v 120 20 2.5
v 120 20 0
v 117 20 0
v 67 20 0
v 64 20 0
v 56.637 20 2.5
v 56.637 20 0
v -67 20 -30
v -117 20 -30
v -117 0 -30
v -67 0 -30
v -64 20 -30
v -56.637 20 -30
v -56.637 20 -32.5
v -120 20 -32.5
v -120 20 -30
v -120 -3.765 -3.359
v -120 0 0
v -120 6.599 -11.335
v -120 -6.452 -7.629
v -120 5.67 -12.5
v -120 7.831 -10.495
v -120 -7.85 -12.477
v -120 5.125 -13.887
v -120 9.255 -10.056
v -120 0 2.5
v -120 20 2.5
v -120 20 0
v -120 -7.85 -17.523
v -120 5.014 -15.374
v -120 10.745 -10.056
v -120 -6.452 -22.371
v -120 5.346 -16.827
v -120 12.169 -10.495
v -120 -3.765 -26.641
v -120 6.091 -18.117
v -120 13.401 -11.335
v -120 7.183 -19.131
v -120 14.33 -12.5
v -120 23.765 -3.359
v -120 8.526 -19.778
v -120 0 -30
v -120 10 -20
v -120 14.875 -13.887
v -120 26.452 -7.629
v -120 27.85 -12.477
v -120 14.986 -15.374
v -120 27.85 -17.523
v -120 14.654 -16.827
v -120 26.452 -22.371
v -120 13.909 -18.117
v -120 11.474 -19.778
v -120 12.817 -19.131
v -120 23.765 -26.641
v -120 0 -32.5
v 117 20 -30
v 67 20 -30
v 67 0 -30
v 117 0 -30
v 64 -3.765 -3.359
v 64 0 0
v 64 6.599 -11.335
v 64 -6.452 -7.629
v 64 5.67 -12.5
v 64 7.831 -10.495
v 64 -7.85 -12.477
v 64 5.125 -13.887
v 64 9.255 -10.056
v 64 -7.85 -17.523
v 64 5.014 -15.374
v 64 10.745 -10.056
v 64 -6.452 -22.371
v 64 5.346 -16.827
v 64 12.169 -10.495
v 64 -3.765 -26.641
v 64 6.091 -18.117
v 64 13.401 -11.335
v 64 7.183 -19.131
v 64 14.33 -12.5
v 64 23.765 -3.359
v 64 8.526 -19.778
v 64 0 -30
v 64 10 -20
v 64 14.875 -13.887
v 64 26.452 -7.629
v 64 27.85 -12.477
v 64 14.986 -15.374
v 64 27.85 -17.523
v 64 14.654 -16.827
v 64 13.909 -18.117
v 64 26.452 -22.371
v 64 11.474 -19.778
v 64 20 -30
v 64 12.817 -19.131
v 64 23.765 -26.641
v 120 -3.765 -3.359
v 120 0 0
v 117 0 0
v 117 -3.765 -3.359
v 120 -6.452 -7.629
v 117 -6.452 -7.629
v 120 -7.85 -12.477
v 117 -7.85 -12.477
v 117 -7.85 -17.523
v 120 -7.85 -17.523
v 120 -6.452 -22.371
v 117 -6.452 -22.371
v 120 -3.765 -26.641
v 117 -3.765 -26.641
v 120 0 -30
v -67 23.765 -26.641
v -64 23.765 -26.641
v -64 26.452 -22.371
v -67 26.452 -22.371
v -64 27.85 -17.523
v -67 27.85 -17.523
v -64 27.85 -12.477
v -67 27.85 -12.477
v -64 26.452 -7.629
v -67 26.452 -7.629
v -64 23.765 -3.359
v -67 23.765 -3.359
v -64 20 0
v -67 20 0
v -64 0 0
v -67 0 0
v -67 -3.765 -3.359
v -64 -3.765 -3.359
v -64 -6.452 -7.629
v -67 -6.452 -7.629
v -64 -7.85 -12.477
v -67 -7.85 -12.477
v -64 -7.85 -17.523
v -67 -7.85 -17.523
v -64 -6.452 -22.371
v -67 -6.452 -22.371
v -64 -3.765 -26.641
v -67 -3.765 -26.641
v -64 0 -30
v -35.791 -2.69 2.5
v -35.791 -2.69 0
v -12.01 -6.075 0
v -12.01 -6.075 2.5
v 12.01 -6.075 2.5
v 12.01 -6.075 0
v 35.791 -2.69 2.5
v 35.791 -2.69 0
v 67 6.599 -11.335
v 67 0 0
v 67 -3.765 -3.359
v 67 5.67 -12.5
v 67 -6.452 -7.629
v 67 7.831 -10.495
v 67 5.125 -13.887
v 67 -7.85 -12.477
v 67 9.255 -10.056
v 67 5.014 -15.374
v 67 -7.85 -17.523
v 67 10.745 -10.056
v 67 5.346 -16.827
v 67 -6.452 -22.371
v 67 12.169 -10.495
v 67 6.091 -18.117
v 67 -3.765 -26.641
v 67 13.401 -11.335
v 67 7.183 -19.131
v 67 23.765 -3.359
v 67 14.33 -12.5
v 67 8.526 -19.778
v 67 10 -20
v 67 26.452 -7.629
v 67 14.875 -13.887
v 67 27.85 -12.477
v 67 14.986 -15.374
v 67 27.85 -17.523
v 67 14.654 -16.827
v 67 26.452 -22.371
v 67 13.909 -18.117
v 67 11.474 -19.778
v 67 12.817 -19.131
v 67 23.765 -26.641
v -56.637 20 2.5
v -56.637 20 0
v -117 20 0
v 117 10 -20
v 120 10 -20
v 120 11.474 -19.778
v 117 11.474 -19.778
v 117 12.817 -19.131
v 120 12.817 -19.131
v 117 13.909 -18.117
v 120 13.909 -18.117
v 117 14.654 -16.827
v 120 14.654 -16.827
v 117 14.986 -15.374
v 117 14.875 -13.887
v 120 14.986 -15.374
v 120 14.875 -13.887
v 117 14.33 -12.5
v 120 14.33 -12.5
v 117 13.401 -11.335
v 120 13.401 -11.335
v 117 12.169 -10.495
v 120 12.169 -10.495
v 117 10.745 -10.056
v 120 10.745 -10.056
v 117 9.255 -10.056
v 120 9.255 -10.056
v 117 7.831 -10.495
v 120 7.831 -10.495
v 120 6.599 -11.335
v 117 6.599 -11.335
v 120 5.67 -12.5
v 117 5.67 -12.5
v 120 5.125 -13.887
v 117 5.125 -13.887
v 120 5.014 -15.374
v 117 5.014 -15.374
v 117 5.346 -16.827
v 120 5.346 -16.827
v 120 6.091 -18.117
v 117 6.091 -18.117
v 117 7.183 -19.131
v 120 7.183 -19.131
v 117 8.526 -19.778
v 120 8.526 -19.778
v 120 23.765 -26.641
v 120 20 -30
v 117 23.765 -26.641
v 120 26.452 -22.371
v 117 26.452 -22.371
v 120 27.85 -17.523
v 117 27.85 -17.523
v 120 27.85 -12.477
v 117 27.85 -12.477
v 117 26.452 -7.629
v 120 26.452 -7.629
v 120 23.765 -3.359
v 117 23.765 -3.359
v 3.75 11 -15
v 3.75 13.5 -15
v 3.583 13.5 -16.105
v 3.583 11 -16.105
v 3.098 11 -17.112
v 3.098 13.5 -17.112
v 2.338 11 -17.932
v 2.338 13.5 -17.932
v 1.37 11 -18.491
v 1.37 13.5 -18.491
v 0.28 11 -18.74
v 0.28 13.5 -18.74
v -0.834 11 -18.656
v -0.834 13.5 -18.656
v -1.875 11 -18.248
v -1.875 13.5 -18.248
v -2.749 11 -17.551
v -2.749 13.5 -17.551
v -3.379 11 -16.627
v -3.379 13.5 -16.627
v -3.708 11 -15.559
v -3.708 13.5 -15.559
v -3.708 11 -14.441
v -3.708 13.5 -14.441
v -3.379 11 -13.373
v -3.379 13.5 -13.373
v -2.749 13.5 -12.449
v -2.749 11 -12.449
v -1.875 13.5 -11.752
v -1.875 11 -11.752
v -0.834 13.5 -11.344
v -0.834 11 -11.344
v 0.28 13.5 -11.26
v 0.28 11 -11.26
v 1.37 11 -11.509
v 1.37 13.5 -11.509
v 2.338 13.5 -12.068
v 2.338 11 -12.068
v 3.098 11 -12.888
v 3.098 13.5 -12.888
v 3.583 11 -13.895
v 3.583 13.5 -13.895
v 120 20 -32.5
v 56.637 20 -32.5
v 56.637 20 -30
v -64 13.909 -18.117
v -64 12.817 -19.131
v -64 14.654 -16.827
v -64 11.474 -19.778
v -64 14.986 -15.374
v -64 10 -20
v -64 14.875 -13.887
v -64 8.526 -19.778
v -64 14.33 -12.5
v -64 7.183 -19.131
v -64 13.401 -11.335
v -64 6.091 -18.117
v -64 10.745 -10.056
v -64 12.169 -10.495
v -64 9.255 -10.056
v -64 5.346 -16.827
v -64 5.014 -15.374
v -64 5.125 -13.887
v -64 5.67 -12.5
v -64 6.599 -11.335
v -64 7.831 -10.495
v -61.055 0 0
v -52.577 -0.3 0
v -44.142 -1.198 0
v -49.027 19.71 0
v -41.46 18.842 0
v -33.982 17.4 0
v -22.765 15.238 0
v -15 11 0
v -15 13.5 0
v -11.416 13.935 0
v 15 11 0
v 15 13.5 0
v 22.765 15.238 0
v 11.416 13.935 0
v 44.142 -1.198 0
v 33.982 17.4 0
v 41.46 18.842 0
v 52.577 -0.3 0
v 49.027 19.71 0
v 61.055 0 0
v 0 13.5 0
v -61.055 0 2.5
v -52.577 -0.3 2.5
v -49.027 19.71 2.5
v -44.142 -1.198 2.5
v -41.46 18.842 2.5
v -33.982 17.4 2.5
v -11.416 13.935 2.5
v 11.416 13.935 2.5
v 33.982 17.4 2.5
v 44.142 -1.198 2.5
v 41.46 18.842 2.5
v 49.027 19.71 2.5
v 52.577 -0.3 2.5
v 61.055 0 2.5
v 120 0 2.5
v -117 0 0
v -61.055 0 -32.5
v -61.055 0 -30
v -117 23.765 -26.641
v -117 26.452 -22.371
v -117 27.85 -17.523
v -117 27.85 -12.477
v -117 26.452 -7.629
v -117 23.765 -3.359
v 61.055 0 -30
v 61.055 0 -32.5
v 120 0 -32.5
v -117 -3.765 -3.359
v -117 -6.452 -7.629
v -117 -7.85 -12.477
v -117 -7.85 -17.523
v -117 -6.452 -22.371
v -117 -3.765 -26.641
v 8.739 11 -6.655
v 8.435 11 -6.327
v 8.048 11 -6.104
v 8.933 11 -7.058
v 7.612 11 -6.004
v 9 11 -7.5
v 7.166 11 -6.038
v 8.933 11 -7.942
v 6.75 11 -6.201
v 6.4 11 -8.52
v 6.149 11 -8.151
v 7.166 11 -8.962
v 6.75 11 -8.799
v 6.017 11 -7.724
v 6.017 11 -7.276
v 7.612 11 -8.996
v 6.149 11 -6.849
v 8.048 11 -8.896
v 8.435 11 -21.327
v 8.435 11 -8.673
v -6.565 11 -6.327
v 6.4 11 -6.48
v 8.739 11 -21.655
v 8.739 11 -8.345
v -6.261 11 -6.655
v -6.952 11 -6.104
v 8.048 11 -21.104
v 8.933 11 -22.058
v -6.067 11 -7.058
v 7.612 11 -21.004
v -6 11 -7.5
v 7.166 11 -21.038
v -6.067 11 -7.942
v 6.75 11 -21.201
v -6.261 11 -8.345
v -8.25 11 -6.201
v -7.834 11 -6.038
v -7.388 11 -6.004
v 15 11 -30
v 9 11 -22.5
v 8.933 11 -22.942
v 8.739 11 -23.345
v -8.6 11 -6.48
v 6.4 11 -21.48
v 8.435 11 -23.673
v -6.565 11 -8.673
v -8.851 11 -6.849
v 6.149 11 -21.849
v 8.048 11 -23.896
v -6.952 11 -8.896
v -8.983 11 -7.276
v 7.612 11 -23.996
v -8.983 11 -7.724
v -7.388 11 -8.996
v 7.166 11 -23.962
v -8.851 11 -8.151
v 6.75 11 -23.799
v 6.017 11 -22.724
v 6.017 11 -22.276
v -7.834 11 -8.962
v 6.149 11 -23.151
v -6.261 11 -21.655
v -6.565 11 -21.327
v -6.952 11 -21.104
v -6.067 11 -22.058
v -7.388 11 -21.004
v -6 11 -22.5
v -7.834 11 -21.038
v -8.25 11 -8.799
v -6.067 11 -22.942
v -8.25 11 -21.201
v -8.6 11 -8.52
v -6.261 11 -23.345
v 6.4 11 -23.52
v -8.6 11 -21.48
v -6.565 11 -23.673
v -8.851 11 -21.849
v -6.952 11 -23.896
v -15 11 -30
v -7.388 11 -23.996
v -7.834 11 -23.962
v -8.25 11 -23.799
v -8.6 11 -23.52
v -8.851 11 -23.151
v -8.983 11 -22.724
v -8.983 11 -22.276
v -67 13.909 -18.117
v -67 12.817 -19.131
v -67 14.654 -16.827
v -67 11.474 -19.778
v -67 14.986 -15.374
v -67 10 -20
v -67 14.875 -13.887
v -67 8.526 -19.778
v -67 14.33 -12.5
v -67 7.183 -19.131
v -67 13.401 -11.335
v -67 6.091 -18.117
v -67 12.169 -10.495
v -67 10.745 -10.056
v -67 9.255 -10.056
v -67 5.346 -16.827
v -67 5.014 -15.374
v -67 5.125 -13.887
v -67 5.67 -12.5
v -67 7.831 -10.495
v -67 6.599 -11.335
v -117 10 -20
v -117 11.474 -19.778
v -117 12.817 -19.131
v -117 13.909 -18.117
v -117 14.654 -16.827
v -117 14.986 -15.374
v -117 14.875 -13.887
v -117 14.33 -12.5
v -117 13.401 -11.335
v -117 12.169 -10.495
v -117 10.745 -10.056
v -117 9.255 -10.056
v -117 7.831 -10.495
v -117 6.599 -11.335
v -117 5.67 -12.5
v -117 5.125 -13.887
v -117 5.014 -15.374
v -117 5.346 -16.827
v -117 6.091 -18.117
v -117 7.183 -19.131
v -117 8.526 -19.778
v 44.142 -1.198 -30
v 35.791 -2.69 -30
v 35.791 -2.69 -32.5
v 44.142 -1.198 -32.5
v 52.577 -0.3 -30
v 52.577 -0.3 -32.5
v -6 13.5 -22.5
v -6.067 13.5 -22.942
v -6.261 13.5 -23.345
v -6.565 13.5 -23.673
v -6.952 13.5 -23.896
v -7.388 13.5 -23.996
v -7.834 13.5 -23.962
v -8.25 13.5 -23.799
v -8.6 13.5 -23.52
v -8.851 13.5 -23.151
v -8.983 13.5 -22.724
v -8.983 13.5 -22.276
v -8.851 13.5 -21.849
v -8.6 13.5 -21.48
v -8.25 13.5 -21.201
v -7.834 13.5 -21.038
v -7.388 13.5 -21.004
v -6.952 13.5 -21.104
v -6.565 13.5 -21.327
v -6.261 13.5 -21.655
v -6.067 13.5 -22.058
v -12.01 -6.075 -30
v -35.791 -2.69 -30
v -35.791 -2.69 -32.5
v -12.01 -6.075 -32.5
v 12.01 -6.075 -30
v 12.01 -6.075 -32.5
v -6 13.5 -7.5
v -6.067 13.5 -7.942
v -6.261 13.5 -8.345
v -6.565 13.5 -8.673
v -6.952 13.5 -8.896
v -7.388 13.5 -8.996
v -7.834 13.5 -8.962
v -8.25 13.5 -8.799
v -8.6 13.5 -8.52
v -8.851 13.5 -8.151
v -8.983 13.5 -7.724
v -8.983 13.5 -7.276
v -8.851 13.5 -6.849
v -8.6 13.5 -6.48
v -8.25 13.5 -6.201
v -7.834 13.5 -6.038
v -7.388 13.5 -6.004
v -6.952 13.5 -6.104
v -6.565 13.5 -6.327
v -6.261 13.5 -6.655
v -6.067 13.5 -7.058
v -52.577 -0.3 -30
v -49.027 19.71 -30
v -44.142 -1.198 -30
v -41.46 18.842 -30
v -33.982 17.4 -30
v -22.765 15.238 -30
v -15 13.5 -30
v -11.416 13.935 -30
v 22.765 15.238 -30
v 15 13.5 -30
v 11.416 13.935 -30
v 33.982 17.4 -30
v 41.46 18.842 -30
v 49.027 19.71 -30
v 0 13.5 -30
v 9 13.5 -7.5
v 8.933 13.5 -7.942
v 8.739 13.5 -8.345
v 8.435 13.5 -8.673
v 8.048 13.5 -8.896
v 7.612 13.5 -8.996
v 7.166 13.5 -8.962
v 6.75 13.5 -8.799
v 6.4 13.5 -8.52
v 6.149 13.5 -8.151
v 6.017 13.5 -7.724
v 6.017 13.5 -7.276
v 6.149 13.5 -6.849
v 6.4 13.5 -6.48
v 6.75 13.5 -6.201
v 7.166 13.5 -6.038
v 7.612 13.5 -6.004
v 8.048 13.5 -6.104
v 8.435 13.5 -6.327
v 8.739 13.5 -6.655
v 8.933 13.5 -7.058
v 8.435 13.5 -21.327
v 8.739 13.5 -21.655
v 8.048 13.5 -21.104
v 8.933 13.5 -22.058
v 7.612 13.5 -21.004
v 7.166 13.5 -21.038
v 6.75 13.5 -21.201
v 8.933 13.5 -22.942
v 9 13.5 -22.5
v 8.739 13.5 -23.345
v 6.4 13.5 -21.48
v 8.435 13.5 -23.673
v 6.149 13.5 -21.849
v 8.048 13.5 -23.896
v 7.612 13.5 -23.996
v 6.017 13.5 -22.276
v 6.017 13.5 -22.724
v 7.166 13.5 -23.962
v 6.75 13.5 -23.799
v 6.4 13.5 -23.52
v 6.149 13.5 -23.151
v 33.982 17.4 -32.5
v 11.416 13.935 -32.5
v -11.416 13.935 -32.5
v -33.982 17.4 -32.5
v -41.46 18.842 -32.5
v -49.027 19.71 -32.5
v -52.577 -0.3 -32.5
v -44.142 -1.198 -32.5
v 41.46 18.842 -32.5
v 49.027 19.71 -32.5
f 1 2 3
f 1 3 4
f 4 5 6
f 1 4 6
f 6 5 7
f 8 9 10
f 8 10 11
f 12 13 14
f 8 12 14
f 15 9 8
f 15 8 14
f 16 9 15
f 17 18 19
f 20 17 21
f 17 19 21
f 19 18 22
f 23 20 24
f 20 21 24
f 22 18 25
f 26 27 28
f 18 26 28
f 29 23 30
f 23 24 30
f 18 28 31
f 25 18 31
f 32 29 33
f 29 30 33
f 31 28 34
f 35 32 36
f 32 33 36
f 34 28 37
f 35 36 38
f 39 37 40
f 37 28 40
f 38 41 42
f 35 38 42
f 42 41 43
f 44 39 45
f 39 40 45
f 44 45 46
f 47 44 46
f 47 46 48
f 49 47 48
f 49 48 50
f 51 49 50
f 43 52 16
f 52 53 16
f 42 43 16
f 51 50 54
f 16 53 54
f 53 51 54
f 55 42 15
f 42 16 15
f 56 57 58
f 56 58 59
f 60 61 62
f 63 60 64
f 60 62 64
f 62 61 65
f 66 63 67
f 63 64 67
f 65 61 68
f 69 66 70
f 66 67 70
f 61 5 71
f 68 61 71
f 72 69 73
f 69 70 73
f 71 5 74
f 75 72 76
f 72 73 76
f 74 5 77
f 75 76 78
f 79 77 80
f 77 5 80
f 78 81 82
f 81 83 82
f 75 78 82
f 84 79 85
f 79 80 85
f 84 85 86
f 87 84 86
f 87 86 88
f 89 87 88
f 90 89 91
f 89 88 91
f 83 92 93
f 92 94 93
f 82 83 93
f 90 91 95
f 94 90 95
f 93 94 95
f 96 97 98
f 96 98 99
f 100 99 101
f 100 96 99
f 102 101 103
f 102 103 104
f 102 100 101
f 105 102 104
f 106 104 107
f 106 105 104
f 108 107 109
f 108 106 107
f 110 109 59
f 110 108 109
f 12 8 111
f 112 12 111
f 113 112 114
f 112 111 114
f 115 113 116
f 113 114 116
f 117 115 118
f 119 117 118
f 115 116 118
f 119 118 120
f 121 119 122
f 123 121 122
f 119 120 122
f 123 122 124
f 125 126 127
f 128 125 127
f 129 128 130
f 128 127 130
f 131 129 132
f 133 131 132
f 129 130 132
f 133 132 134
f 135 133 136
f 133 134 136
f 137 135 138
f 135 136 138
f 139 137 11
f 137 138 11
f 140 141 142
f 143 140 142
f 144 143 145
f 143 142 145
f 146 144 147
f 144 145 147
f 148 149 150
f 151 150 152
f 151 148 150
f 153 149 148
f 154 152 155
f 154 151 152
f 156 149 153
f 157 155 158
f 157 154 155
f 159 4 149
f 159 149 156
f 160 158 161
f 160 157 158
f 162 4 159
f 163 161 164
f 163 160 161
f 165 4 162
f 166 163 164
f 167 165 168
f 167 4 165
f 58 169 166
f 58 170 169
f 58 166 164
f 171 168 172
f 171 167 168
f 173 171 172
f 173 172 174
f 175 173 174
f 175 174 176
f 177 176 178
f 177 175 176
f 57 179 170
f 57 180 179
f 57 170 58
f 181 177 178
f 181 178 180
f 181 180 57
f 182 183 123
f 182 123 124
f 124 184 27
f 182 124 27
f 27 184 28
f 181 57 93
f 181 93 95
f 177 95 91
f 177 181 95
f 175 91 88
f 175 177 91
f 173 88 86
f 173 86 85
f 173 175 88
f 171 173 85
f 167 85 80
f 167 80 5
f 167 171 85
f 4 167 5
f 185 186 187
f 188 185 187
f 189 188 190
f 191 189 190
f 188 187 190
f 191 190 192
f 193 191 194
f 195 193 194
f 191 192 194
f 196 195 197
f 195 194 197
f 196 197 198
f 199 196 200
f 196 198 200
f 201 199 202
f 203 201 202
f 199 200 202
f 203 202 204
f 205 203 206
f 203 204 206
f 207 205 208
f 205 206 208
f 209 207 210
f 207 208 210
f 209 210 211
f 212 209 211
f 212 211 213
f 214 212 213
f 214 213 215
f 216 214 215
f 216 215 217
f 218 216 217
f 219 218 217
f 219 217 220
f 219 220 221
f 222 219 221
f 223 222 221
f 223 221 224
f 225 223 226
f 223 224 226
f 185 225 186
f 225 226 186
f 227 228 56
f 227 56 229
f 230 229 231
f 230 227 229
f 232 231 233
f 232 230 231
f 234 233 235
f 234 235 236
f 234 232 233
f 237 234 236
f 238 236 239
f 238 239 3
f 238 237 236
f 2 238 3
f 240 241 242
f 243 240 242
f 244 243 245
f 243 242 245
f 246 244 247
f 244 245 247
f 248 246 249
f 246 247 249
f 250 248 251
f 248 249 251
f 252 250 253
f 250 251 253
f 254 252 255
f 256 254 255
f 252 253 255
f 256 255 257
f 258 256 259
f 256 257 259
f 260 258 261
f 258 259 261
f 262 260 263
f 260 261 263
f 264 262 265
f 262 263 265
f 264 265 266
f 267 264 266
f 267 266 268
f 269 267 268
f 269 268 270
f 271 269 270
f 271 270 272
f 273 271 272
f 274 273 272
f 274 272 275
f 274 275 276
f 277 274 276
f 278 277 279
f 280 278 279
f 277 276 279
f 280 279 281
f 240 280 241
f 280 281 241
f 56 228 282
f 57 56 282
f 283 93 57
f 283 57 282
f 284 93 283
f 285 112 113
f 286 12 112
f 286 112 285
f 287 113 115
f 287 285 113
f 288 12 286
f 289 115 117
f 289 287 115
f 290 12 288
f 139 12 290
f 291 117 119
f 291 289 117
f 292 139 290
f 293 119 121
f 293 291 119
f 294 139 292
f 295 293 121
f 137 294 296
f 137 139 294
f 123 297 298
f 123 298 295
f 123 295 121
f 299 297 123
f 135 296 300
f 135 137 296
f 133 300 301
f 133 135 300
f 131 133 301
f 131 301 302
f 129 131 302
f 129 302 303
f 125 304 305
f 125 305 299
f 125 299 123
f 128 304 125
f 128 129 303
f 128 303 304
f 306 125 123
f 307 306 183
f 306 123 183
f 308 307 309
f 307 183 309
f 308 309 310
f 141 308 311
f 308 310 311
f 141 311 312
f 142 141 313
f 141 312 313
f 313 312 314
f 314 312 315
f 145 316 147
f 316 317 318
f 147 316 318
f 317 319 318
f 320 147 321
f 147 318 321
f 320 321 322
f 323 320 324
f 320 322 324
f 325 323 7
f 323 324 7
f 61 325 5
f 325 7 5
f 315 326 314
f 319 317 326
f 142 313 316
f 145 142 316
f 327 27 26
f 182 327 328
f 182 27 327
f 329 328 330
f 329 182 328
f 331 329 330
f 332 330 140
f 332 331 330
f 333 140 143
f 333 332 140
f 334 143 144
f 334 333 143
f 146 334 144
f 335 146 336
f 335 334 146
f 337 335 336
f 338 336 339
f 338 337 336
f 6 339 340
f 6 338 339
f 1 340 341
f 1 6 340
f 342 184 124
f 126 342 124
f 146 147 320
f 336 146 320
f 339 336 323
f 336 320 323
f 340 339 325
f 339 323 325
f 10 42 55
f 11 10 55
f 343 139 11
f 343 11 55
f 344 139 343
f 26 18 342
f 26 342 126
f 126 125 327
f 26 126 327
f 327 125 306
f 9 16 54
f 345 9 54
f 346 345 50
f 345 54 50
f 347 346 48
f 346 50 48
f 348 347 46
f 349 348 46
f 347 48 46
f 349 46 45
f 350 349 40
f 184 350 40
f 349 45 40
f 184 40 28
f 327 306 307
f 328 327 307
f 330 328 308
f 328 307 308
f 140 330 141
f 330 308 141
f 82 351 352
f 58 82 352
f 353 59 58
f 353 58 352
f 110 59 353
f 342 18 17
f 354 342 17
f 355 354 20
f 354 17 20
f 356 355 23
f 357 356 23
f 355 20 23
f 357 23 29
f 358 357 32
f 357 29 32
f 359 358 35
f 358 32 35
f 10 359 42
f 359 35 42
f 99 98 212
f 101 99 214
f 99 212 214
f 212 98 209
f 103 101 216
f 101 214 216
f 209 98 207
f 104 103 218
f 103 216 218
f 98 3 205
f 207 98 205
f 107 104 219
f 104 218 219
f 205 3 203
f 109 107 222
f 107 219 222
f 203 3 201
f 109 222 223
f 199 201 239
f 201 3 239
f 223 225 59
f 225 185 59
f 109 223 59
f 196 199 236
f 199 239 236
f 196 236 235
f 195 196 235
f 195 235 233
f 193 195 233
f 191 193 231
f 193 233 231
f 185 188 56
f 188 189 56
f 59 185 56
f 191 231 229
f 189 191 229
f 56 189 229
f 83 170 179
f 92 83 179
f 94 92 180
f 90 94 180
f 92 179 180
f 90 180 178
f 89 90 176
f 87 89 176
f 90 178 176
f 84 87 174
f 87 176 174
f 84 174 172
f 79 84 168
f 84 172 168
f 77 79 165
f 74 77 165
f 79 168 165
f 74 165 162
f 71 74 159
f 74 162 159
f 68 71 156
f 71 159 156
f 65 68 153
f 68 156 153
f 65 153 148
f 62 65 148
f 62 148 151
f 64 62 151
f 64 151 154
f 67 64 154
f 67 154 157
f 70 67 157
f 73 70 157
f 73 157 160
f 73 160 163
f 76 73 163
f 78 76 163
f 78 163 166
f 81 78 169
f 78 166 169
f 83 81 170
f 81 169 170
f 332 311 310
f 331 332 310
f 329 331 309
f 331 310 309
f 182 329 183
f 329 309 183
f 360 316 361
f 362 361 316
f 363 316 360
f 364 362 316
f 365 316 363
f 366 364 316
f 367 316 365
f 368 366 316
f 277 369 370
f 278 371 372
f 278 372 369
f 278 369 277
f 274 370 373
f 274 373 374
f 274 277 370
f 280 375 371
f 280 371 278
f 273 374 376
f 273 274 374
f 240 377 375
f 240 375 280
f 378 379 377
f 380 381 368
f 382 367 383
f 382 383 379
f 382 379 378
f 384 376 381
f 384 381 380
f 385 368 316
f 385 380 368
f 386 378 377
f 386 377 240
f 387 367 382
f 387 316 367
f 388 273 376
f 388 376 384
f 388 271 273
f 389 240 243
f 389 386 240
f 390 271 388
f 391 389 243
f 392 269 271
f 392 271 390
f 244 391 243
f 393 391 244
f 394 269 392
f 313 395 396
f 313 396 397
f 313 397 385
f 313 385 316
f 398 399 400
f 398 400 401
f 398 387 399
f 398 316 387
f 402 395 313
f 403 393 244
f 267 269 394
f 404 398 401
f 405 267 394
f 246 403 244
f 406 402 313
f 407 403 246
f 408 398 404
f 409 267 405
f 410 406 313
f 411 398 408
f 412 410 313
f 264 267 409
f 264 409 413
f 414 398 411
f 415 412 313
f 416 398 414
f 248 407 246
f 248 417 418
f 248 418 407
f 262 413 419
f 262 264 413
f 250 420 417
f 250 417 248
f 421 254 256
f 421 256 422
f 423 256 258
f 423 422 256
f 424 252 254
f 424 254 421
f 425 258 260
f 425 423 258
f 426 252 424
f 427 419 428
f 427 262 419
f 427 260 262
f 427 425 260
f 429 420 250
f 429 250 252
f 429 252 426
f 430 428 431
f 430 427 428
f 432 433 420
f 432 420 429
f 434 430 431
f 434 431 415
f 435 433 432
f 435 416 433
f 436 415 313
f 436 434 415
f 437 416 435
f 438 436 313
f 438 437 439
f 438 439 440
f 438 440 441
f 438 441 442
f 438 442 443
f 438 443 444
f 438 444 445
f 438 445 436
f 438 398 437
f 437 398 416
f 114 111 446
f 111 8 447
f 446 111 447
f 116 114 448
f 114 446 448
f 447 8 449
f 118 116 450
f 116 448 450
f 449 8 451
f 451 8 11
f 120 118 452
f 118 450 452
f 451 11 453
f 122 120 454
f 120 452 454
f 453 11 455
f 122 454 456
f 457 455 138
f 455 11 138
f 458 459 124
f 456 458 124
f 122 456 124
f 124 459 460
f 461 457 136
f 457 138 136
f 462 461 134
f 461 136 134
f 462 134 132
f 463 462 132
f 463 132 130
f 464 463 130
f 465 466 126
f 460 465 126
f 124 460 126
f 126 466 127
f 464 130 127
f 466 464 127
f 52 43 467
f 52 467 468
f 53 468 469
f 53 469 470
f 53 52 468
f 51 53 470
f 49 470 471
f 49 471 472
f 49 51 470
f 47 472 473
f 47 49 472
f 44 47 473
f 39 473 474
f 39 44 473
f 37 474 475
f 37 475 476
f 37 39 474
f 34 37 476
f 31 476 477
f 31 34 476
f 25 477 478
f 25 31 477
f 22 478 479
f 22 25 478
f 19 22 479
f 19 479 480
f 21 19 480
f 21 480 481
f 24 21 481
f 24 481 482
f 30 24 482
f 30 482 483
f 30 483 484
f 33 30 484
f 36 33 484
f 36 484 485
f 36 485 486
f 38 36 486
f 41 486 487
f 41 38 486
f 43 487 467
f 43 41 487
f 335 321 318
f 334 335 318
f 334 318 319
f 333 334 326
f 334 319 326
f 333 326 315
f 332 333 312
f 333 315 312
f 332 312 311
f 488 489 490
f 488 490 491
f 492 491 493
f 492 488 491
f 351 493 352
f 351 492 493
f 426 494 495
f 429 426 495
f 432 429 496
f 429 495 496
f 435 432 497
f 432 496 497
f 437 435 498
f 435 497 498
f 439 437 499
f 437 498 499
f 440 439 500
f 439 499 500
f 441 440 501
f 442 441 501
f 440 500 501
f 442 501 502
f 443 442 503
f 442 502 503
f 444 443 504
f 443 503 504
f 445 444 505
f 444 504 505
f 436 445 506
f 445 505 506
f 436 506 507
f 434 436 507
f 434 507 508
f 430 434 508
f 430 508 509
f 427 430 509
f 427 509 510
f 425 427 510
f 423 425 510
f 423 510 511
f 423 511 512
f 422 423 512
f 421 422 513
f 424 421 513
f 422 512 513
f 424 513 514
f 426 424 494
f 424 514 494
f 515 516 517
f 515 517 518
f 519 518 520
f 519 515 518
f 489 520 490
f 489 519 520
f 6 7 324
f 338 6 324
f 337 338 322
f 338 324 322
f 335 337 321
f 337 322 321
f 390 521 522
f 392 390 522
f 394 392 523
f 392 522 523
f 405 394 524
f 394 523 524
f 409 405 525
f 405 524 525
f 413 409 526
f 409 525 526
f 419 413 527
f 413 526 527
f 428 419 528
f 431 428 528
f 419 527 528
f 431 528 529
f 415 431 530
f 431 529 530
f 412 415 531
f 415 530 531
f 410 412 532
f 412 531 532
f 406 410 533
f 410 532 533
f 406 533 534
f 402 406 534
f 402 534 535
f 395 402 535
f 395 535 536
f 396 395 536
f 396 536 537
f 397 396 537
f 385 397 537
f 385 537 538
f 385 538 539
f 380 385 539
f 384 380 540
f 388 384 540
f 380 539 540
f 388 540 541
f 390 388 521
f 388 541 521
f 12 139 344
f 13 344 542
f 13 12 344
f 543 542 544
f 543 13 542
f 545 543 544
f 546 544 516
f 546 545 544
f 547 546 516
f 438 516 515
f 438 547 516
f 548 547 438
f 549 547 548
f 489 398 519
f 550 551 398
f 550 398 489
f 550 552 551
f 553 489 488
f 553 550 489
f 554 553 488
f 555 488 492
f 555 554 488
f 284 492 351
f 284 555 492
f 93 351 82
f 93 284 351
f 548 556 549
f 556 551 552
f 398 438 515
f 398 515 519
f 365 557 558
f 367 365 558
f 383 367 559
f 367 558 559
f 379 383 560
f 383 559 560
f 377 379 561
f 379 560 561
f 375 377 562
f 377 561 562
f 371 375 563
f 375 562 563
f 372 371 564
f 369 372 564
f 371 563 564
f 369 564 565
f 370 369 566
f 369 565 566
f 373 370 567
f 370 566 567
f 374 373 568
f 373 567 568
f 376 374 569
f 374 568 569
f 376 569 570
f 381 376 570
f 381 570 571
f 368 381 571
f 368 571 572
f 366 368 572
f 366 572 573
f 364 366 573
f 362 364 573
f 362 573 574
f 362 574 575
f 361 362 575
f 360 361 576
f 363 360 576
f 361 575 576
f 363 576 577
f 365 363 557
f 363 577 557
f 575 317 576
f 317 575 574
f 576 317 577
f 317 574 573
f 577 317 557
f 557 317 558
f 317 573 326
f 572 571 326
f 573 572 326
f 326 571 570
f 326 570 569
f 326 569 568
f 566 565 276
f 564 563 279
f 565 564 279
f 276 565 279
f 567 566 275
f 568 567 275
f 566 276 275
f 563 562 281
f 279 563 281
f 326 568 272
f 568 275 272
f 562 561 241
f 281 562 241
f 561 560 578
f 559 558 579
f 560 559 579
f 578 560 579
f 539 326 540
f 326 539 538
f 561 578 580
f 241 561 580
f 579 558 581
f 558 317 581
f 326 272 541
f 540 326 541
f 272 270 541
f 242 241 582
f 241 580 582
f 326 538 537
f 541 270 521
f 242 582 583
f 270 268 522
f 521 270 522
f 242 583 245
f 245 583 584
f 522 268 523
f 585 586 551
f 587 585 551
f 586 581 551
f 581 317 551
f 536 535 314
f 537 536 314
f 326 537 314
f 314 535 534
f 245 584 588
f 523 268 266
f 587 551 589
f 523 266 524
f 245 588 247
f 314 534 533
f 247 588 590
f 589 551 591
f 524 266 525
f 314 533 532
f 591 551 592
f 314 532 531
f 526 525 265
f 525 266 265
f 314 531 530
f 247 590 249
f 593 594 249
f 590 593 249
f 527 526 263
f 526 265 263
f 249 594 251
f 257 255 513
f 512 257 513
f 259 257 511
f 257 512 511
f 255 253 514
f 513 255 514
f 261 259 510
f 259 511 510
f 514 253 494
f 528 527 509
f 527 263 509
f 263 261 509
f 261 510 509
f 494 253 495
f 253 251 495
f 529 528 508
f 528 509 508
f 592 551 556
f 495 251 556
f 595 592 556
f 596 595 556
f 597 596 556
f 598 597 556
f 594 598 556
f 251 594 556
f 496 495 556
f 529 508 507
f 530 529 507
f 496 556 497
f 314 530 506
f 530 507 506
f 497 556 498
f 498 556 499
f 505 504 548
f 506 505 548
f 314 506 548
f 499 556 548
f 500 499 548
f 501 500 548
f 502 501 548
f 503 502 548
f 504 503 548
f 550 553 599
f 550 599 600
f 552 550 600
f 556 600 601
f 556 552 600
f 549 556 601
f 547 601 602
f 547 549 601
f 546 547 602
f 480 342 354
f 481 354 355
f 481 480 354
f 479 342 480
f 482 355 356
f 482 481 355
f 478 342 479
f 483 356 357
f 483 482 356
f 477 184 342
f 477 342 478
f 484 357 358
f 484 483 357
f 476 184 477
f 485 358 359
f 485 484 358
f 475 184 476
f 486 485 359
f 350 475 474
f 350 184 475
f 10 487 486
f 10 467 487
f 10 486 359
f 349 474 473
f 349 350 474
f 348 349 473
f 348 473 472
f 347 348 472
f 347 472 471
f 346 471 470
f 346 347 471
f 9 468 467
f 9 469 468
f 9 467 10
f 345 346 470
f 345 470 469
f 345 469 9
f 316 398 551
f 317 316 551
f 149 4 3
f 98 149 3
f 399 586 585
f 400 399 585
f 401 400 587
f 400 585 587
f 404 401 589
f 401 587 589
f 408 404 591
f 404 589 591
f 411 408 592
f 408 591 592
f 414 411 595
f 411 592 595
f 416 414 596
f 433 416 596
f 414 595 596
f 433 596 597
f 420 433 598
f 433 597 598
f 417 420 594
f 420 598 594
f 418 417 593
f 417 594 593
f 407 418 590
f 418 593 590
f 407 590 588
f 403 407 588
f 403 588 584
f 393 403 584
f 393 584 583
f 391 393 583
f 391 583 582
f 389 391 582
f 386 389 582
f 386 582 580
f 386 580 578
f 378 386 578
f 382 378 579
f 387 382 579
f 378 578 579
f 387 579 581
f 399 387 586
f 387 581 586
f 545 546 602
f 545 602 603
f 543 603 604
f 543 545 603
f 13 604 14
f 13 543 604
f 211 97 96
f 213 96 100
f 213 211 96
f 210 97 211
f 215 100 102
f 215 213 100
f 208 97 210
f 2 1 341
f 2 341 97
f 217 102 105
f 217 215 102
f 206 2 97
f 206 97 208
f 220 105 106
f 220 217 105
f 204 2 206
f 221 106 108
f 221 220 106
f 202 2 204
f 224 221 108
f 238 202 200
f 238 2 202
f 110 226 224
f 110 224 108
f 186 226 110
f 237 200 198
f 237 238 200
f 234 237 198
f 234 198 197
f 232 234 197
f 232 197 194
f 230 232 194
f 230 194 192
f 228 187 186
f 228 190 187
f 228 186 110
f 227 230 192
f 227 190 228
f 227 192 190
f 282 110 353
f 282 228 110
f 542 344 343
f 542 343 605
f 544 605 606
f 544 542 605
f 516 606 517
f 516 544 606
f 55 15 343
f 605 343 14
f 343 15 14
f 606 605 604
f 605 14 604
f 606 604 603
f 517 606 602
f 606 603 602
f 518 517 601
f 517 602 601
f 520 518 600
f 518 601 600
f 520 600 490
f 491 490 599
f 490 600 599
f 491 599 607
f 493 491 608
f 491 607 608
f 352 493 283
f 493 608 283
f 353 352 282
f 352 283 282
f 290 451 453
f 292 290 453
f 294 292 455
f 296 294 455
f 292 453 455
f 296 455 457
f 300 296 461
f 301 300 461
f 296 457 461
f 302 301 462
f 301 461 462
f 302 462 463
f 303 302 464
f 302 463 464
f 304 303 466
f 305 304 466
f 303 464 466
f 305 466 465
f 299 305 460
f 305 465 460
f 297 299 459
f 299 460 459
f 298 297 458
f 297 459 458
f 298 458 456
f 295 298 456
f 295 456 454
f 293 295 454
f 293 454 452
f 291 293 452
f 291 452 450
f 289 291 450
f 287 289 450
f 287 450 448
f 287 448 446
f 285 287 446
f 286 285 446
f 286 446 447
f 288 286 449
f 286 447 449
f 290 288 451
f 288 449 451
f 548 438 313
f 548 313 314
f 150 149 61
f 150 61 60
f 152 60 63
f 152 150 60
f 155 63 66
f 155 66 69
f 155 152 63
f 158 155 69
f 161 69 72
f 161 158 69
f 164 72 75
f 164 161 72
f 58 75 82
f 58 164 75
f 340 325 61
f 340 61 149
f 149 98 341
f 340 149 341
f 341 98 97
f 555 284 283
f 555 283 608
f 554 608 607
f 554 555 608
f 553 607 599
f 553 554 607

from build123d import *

# Parameters (mm, degrees)
BOSS_EXTRUDE2_DEPTH     = 2.5
SKETCH2_R               = 5
BOSS_EXTRUDE3_DEPTH     = 3
LPATTERN1_COUNT         = 2
LPATTERN1_PITCH         = 53
MIRROR8_COPY_1_SKETCH_R = 5
MIRROR8_COPY_1_DEPTH    = 3
SKETCH4_W               = 30
SKETCH4_H               = 2.5
BOSS_EXTRUDE4_DEPTH     = 35
SKETCH6_R               = 3.75
SKETCH6_R_2             = 1.5
CUT_EXTRUDE1_DEPTH      = 2.5


with BuildPart() as part:
    # Sketch1 → Boss-Extrude2 (new body)
    with BuildSketch(Plane.XY):
        with BuildLine():
            Line((-120, 0), (-61.0553028, 0))
            ThreePointArc((-61.0553028, 0), (-48.351787131, -0.674308342), (-35.791039572, -2.689655172))
            ThreePointArc((-35.791039572, -2.689655172), (0, -6.5), (35.791039572, -2.689655172))
            ThreePointArc((35.791039572, -2.689655172), (48.351787131, -0.674308342), (61.0553028, 0))
            Line((61.0553028, 0), (120, 0))
            Line((120, 0), (120, 20))
            Line((120, 20), (56.637002039, 20))
            ThreePointArc((56.637002039, 20), (45.235247788, 19.347873656), (33.982201224, 17.4))
            ThreePointArc((33.982201224, 17.4), (0, 13.5), (-33.982201224, 17.4))
            ThreePointArc((-33.982201224, 17.4), (-45.235247788, 19.347873656), (-56.637002039, 20))
            Line((-56.637002039, 20), (-120, 20))
            Line((-120, 20), (-120, 0))
        make_face()
    extrude(amount=BOSS_EXTRUDE2_DEPTH)


with BuildPart() as body_2:
    # Mirror7: mirrored copy
    add(part.part.mirror(Plane.XY.offset(-15)))


with BuildPart() as part_1:
    add(part.part)

    add(body_2.part)  # Boss-Extrude3 merges body 2
    # Sketch2 → Boss-Extrude3 (add)
    with BuildSketch(Plane(origin=(120, 0, 0), x_dir=(0, 0, -1), z_dir=(1, 0, 0))):
        with BuildLine():
            Line((0, 20), (0, 0))
            ThreePointArc((0, 0), (15, -8.027756377), (30, 0))
            Line((30, 0), (30, 20))
            ThreePointArc((30, 20), (15, 28.027756377), (0, 20))
        make_face()
        with Locations((15, 10)):
            Circle(SKETCH2_R, mode=Mode.SUBTRACT)
    boss_extrude3 = extrude(amount=-BOSS_EXTRUDE3_DEPTH)

    # LPattern1: Boss-Extrude3 ×2
    with Locations(*[(-i * LPATTERN1_PITCH, 0, 0) for i in range(1, LPATTERN1_COUNT)]):
        add(boss_extrude3)

    # Mirror8: Boss-Extrude3 across plane
    add(boss_extrude3.mirror(Plane(origin=(0, 0, 0), x_dir=(0, 0, 1), z_dir=(1, 0, 0))))

    # Mirror8 copy 1 sketch → Mirror8 copy 1 (add)
    with BuildSketch(Plane(origin=(-67, 0, 0), x_dir=(0, 0, -1), z_dir=(-1, 0, 0))):
        with BuildLine():
            Line((0, -20), (0, 0))
            ThreePointArc((0, 0), (15, 8.027756377), (30, 0))
            Line((30, 0), (30, -20))
            ThreePointArc((30, -20), (15, -28.027756377), (0, -20))
        make_face()
        with Locations((15, -10)):
            Circle(MIRROR8_COPY_1_SKETCH_R, mode=Mode.SUBTRACT)
    extrude(amount=-MIRROR8_COPY_1_DEPTH)

    # Sketch4 → Boss-Extrude4 (add)
    with BuildSketch(Plane(origin=(0, 0, -32.5), x_dir=(-1, 0, 0), z_dir=(0, 0, -1))):
        with Locations((0, 12.25)):
            Rectangle(SKETCH4_W, SKETCH4_H)
    extrude(amount=-BOSS_EXTRUDE4_DEPTH)

    # Sketch6 → Cut-Extrude1 (cut)
    with BuildSketch(Plane(origin=(0, 13.5, 0), x_dir=(1, 0, 0), z_dir=(0, 1, 0))):
        with Locations((0, 15)):
            Circle(SKETCH6_R)
        with Locations((-7.5, 22.5)):
            Circle(SKETCH6_R_2)
        with Locations((7.5, 22.5)):
            Circle(SKETCH6_R_2)
        with Locations((7.5, 7.5)):
            Circle(SKETCH6_R_2)
        with Locations((-7.5, 7.5)):
            Circle(SKETCH6_R_2)
    extrude(amount=-CUT_EXTRUDE1_DEPTH, mode=Mode.SUBTRACT)


solid = part_1.part
